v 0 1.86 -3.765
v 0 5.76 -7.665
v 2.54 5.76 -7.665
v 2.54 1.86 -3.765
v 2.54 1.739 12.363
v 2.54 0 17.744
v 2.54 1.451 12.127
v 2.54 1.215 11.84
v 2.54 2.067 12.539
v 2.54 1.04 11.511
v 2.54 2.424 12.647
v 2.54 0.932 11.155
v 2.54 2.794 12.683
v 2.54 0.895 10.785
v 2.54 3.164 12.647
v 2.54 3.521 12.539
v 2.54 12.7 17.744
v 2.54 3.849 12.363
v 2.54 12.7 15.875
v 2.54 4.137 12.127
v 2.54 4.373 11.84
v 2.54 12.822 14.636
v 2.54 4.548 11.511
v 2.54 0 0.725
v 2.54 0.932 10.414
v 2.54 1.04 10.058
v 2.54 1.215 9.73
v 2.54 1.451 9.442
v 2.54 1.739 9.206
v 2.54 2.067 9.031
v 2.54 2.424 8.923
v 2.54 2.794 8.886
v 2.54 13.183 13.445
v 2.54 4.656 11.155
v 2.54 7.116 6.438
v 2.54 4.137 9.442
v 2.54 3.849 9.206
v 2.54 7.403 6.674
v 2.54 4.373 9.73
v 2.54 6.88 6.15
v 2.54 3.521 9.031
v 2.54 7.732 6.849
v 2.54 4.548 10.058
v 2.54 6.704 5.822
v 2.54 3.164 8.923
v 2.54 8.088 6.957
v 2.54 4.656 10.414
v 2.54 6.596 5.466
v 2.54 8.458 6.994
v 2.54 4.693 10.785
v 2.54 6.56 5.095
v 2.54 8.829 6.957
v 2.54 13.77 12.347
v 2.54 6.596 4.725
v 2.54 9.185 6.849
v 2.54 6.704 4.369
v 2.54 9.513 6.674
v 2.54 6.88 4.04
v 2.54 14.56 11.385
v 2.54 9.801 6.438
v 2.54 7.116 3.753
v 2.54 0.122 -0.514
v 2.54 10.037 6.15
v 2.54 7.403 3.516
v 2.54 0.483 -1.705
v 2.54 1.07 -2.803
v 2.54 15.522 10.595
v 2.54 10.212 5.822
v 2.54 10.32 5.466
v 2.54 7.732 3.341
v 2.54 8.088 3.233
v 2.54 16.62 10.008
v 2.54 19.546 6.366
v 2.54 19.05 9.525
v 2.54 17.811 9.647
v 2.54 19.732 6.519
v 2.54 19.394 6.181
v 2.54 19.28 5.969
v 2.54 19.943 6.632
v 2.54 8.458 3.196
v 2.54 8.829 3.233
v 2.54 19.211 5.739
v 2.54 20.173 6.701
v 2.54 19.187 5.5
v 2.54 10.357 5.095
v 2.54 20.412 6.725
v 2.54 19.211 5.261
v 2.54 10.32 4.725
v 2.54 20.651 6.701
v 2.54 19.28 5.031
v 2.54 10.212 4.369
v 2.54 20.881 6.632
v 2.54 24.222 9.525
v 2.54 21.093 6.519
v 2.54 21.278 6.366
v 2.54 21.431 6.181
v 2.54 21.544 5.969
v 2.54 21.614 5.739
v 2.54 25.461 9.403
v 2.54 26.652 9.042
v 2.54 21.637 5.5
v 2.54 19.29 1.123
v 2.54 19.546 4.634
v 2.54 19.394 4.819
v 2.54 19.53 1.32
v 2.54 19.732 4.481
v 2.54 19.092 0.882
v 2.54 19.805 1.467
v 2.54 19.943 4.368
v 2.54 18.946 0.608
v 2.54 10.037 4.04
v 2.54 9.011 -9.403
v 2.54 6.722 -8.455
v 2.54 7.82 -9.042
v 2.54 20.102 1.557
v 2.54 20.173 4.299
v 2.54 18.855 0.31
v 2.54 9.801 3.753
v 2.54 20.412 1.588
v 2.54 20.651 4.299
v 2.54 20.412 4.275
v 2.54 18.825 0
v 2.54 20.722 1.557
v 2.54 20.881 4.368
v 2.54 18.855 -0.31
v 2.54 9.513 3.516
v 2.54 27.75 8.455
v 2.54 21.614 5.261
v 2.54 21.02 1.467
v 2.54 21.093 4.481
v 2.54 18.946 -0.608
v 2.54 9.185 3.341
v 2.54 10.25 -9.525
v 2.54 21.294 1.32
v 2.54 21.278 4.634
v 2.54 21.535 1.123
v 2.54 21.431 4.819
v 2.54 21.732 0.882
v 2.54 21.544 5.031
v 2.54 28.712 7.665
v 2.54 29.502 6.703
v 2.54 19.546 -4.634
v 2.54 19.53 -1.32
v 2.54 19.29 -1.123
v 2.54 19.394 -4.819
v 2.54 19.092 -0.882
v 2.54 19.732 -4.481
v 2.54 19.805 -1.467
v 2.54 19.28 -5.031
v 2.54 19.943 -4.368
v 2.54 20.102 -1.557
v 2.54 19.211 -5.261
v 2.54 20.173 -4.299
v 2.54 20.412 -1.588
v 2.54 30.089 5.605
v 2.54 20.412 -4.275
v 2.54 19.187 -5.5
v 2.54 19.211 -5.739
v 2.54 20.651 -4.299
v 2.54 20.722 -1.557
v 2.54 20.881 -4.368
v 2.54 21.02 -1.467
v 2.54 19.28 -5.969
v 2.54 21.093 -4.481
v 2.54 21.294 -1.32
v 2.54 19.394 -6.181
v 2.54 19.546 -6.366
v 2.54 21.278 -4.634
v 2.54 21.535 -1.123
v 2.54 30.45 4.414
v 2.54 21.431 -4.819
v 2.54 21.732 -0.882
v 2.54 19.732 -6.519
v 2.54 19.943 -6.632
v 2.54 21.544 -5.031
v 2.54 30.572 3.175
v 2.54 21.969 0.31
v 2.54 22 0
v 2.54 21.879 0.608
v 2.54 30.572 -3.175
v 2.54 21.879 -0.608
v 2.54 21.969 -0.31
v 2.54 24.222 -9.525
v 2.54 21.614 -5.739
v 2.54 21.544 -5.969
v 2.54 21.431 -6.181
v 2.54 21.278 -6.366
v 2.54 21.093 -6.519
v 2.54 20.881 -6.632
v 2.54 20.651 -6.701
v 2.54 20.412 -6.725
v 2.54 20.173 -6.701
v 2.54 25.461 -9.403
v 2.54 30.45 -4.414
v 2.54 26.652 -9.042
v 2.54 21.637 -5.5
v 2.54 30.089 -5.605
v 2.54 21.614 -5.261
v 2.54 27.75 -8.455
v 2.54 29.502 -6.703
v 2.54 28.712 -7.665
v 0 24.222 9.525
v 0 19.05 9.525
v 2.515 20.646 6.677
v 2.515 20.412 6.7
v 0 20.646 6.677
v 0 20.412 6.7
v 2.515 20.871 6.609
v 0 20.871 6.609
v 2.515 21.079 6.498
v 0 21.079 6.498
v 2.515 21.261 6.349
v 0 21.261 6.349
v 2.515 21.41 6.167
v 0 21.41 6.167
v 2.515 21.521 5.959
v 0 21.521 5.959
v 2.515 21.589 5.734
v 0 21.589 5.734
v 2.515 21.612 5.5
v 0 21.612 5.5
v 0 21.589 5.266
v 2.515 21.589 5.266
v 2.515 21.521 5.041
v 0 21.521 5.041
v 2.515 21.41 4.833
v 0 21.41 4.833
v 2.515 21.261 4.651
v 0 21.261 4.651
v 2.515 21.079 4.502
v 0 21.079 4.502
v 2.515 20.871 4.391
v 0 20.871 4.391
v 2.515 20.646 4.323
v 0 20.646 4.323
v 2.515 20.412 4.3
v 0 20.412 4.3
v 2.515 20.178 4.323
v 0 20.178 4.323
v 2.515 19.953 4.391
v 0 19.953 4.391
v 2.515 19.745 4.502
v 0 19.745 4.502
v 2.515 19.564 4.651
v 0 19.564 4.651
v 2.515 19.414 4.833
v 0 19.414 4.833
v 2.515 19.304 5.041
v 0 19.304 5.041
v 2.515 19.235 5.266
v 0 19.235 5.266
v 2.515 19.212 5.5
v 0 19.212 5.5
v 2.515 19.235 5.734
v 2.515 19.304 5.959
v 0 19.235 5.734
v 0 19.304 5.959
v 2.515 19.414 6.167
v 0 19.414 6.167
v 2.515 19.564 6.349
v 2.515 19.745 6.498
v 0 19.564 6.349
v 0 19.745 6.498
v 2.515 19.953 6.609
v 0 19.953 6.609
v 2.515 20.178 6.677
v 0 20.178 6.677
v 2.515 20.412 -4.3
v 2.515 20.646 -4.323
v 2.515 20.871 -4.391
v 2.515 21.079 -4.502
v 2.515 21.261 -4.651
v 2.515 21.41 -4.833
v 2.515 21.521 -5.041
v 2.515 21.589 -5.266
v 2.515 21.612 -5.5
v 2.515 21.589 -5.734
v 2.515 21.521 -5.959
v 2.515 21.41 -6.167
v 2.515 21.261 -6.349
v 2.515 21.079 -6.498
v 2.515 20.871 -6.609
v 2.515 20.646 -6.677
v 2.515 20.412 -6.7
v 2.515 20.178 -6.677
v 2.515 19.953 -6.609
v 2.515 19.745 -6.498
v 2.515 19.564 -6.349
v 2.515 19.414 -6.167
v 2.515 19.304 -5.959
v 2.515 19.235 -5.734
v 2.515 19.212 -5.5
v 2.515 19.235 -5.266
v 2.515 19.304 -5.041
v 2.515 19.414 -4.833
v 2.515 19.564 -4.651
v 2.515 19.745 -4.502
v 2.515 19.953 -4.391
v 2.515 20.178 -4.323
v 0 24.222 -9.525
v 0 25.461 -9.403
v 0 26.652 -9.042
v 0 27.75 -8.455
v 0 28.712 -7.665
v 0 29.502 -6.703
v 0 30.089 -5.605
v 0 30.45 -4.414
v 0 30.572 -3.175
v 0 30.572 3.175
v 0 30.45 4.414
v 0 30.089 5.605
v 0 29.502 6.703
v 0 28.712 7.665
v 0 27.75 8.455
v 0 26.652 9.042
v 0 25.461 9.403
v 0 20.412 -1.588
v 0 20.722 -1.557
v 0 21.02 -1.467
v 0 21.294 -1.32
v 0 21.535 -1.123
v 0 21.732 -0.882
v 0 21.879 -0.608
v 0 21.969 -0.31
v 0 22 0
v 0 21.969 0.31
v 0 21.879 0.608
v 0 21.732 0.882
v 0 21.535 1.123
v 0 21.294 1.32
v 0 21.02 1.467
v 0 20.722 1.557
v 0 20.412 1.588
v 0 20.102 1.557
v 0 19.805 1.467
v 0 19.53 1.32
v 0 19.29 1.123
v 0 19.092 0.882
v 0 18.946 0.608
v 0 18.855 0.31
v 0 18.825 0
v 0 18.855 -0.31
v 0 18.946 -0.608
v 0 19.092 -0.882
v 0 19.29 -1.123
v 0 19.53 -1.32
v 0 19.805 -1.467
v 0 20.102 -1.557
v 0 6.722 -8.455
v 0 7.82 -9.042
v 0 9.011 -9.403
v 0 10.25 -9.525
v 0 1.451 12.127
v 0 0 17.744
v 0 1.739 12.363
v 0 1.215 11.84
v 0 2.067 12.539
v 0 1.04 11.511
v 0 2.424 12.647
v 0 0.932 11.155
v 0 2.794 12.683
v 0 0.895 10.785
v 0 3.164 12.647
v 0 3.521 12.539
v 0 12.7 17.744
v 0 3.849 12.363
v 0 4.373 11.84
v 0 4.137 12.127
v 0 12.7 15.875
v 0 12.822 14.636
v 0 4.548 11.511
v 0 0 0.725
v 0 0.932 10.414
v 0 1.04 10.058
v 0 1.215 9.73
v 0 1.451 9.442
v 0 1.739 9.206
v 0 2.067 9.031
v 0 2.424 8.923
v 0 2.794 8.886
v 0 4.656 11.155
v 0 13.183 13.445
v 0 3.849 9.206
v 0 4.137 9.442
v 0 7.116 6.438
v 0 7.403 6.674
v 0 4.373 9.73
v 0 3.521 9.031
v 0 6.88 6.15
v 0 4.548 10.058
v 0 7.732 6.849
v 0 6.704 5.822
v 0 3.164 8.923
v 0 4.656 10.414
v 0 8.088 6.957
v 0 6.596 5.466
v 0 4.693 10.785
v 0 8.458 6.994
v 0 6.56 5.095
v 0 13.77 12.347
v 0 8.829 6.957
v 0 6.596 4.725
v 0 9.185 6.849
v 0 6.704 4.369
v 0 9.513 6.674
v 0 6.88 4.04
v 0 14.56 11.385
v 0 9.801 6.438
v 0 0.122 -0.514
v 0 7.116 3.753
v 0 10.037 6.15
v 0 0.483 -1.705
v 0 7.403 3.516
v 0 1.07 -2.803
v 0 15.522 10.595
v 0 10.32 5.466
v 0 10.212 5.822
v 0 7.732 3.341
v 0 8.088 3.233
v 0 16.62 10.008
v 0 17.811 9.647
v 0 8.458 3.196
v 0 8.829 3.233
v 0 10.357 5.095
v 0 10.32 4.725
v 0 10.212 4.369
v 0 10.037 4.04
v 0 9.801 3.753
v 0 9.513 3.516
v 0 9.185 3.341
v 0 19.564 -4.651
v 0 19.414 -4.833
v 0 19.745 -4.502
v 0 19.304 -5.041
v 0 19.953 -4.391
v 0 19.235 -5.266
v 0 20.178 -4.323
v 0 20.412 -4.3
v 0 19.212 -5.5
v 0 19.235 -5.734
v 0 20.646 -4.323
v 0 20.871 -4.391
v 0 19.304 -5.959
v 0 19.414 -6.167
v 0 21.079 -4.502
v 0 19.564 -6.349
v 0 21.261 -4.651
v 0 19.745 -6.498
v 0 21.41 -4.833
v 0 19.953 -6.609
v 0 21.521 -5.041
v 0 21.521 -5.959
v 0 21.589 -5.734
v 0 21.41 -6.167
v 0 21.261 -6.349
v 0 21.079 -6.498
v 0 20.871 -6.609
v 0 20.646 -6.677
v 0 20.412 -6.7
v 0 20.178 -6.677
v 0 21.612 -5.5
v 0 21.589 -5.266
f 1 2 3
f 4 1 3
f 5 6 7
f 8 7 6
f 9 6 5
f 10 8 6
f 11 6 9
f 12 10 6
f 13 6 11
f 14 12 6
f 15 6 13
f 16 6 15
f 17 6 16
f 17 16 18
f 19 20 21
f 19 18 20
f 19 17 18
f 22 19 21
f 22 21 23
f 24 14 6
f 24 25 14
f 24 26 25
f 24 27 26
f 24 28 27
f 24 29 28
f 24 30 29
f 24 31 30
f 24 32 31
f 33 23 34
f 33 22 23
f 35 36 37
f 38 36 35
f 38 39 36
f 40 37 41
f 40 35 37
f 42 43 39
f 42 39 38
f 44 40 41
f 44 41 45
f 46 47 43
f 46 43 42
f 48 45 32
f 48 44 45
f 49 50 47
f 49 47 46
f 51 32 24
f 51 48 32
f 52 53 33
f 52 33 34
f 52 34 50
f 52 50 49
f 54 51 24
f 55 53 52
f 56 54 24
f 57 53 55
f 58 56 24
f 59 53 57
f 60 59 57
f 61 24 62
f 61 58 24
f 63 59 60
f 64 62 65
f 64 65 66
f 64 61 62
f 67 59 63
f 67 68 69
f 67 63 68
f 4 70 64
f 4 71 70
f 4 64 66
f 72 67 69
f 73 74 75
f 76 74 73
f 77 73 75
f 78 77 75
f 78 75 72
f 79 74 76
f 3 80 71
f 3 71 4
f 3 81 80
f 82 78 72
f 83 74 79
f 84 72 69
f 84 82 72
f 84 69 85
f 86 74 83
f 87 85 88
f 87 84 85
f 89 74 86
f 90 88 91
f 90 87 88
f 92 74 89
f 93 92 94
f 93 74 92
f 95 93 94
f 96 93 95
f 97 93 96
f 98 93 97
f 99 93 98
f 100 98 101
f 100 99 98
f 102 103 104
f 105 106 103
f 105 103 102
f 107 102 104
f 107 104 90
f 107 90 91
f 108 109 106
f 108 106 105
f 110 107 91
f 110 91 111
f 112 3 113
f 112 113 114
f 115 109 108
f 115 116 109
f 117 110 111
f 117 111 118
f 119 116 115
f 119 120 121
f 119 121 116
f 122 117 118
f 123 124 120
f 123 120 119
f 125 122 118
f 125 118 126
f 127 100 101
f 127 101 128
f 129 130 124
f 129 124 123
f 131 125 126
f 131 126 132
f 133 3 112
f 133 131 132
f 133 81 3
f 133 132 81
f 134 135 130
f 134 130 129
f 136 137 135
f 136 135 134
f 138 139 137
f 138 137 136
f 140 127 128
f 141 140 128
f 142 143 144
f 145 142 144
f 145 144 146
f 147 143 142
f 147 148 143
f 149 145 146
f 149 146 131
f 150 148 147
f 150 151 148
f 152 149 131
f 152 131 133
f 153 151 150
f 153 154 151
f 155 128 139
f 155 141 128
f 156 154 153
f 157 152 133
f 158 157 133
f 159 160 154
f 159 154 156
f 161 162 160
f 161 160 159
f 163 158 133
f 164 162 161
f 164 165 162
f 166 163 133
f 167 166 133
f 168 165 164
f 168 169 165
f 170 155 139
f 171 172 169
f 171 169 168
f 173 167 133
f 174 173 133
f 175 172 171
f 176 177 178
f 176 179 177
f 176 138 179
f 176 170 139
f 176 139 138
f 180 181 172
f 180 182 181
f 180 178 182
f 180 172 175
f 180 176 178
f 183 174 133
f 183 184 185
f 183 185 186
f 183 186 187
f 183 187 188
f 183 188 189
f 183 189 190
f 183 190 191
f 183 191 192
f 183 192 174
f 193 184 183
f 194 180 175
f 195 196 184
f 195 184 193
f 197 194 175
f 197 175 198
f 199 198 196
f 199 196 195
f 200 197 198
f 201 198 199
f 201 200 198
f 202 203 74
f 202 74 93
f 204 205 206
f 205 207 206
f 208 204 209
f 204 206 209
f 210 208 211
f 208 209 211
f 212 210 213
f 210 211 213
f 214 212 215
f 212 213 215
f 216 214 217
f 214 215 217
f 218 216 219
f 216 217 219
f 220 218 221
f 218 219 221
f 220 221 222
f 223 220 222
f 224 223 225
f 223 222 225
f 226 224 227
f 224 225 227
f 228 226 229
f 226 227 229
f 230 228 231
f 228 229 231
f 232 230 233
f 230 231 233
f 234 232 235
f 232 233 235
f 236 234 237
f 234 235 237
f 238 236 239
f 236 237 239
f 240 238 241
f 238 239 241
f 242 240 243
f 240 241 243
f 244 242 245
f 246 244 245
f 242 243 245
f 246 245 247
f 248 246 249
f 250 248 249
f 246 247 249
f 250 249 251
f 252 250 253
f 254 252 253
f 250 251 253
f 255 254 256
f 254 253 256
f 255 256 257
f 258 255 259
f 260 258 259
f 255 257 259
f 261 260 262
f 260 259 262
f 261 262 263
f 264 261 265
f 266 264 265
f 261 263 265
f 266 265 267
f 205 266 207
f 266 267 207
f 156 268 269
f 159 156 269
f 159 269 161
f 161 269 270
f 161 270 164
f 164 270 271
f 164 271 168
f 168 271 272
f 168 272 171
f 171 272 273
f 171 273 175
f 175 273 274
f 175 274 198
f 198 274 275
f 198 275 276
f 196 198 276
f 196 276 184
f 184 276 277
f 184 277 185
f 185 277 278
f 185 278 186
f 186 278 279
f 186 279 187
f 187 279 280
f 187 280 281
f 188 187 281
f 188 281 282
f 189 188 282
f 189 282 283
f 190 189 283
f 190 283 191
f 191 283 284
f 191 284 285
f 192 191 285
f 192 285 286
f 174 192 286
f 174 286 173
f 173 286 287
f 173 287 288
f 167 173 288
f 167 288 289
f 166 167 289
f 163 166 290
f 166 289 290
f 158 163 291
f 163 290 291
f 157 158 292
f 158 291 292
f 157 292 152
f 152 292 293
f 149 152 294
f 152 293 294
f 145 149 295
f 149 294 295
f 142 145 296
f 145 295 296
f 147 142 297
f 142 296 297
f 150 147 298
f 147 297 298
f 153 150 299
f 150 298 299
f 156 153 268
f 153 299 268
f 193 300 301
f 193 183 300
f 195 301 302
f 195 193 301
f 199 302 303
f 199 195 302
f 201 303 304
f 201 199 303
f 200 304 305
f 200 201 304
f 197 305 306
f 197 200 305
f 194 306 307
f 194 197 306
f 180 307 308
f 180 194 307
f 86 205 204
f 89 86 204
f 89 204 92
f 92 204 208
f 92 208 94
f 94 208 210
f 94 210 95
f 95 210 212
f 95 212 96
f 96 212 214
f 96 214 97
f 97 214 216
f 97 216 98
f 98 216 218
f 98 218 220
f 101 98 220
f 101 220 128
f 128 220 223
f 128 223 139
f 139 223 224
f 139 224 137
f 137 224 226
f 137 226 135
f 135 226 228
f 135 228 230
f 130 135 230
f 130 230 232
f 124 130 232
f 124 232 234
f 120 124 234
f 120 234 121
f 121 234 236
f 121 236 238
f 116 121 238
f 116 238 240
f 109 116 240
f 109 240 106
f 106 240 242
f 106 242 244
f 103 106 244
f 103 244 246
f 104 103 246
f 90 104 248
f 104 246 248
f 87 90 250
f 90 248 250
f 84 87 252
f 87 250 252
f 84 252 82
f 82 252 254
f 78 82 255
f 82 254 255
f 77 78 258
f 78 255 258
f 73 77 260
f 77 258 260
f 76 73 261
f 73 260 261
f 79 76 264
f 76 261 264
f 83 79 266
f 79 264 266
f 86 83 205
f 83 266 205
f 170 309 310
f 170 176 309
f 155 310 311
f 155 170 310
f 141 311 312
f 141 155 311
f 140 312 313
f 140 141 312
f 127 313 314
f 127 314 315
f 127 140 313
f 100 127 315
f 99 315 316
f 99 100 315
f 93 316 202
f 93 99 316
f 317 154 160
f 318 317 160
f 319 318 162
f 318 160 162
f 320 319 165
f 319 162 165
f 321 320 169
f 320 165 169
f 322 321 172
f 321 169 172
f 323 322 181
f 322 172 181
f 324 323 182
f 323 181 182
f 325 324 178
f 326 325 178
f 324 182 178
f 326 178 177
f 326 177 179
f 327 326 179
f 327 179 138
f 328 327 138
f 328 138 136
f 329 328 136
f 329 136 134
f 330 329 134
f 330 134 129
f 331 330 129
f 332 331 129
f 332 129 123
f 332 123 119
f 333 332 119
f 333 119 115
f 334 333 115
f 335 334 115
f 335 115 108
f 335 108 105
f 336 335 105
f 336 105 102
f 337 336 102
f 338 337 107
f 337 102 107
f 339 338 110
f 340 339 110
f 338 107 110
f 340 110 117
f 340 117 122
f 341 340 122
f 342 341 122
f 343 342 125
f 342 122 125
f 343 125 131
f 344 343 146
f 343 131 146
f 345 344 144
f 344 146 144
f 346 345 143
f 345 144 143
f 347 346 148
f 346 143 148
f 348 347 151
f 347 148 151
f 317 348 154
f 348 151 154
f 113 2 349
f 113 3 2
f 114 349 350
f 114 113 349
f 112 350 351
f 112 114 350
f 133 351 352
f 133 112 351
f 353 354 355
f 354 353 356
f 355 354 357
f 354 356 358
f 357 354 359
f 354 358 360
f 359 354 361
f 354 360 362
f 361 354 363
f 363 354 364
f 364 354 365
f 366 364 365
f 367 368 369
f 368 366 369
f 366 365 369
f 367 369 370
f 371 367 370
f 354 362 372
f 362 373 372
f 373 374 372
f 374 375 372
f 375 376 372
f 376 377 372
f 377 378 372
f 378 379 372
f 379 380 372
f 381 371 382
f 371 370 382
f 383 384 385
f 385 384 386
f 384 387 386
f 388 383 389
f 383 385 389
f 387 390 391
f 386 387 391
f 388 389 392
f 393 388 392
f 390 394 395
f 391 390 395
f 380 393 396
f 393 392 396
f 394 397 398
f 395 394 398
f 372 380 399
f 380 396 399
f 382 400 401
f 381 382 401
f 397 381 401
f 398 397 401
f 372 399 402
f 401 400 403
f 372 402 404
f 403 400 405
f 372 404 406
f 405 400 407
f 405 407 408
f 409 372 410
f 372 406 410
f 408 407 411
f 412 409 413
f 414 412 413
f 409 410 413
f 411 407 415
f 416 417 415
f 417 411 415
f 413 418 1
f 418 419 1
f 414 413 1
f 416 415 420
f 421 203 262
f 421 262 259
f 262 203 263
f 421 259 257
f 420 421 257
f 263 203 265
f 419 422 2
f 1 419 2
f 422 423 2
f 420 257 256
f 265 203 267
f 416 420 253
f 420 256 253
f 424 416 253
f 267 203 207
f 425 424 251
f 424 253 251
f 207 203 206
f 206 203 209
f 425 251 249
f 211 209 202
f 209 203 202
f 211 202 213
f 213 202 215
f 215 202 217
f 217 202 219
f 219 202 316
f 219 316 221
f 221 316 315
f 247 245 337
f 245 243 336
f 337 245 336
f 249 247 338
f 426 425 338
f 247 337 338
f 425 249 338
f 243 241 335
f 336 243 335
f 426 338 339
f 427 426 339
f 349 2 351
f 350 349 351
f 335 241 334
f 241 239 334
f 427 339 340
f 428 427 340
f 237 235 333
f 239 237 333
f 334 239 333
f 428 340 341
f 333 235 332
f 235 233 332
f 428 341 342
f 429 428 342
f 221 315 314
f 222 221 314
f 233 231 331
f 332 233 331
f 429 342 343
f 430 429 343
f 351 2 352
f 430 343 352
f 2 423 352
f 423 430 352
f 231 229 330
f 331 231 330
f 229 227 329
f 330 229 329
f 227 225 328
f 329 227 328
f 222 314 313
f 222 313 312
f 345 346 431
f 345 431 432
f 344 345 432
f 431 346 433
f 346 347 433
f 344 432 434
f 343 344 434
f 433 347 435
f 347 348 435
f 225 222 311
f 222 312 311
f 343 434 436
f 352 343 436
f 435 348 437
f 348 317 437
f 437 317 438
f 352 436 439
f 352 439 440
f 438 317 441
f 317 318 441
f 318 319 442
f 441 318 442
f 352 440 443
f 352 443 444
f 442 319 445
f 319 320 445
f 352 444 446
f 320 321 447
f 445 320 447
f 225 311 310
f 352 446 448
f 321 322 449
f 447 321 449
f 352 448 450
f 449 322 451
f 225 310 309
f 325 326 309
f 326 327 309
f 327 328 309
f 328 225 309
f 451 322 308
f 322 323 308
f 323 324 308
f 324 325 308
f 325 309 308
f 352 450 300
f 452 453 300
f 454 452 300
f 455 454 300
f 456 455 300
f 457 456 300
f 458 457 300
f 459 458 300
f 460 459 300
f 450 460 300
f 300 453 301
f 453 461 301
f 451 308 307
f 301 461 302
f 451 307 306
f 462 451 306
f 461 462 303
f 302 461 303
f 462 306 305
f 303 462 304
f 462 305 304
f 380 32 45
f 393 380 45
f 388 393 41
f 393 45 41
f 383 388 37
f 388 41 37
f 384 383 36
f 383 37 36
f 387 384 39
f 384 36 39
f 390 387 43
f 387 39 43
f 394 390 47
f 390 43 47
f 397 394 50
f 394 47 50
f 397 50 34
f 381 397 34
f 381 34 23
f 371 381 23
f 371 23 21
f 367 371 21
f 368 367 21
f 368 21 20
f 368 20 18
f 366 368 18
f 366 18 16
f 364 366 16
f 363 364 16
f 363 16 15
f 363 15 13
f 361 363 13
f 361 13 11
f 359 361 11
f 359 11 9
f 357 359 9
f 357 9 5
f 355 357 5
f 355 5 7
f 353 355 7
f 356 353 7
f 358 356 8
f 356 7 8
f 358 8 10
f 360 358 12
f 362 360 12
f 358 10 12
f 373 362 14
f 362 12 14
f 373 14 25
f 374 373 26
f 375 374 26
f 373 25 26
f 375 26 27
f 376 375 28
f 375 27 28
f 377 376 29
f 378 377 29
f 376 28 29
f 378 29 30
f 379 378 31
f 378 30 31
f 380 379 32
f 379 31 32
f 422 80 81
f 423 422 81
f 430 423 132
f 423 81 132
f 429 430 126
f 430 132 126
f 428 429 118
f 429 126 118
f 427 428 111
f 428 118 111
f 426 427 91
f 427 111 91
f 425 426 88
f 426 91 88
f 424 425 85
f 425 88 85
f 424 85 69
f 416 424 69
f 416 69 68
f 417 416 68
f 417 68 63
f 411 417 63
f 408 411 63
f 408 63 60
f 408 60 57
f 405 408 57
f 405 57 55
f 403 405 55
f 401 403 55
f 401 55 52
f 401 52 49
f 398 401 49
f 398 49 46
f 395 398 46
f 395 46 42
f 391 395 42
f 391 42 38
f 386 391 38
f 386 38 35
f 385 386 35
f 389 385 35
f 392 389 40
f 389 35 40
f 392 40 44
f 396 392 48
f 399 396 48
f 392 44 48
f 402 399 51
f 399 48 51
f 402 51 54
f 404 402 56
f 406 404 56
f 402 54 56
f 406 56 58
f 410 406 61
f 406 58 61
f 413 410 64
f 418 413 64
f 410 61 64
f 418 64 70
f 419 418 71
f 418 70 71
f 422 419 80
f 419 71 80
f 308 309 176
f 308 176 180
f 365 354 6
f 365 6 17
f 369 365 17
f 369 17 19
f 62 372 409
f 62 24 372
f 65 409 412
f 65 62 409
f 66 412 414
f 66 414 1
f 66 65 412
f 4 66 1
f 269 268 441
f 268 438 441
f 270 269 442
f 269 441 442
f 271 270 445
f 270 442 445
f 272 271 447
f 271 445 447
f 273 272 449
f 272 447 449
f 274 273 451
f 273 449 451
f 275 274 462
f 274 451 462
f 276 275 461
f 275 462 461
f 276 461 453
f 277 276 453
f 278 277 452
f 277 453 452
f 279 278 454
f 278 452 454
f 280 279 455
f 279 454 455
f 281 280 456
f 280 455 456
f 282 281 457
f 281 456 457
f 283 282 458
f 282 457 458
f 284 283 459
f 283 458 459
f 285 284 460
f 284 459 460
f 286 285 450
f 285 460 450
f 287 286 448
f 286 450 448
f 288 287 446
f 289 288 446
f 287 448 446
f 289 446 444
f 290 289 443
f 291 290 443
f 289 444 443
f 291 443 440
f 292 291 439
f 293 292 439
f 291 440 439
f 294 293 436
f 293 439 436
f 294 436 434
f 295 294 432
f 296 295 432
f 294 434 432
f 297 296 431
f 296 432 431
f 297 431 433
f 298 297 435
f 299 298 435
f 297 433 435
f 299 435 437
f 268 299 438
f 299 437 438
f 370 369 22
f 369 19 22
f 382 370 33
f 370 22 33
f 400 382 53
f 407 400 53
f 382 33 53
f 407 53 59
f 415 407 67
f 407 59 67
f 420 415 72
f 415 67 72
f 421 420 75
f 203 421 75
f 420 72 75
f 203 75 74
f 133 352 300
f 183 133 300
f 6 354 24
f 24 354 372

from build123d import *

# Parameters (mm, degrees)
SKETCH1_W                      = 19.05
SKETCH1_H                      = 30.5721766
BOSS_EXTRUDE1_DEPTH            = 2.54
SKETCH2_R                      = 1.5875
CUT_EXTRUDE1_DEPTH             = 33.122191816
M2_CLEARANCE_HOLE1_D           = 2.4
M2_CLEARANCE_HOLE1_DEPTH       = 12.0000014
M2_CLEARANCE_HOLE1_CSINK_D     = 2.45
M2_CLEARANCE_HOLE1_CSINK_ANGLE = 90
M2_CLEARANCE_HOLE1_TIP         = 0.721032743
SKETCH6_W                      = 8.2193384
SKETCH6_H                      = 12.7
BOSS_EXTRUDE2_DEPTH            = 2.54
CHAMFER1_SIZE                  = 7.62
FILLET2_R                      = 6.35
F_6_CLEARANCE_HOLE1_D          = 3.7973


with BuildPart() as part:
    # Sketch1 → Boss-Extrude1 (new body)
    with BuildSketch(Plane(origin=(0, 0, 0), x_dir=(0, 0, -1), z_dir=(1, 0, 0))):
        with Locations((0, 15.2860883)):
            Rectangle(SKETCH1_W, SKETCH1_H)
    extrude(amount=BOSS_EXTRUDE1_DEPTH)

    # Sketch2 → Cut-Extrude1 (cut, through all)
    with BuildSketch(Plane(origin=(2.54, 0, 0), x_dir=(0, 0, -1), z_dir=(1, 0, 0))):
        with Locations((0, 20.4121766)):
            Circle(SKETCH2_R)
    extrude(amount=-CUT_EXTRUDE1_DEPTH, mode=Mode.SUBTRACT)

    # M2 Clearance Hole1
    with Locations(Plane(origin=(2.54, 0, 0), x_dir=(0, 0, -1), z_dir=(1, 0, 0))):
        with Locations((-5.5, 20.4121766), (5.5, 20.4121766)):
            CounterSinkHole(M2_CLEARANCE_HOLE1_D / 2, M2_CLEARANCE_HOLE1_CSINK_D / 2, depth=M2_CLEARANCE_HOLE1_DEPTH, counter_sink_angle=M2_CLEARANCE_HOLE1_CSINK_ANGLE)
            with Locations((0, 0, -(M2_CLEARANCE_HOLE1_DEPTH + M2_CLEARANCE_HOLE1_TIP / 2))):  # 118° drill point
                Cone(0, M2_CLEARANCE_HOLE1_D / 2, M2_CLEARANCE_HOLE1_TIP, mode=Mode.SUBTRACT)

    # Sketch6 → Boss-Extrude2 (add)
    with BuildSketch(Plane(origin=(0, 0, 0), x_dir=(0, 0, -1), z_dir=(1, 0, 0))):
        with Locations((-13.6346692, 6.35)):
            Rectangle(SKETCH6_W, SKETCH6_H)
    extrude(amount=BOSS_EXTRUDE2_DEPTH)

    # Chamfer1
    chamfer1_edges = [part.edges().sort_by_distance(p)[0] for p in [
        (1.27, 0, -9.525),
    ]]
    chamfer(chamfer1_edges, length=CHAMFER1_SIZE)

    # Fillet2
    fillet2_edges = [part.edges().sort_by_distance(p)[0] for p in [
        (1.27, 12.7, 9.525),
        (1.27, 7.62, -9.525),
        (1.27, 0, -1.905),
        (1.27, 30.5721766, 9.525),
        (1.27, 30.5721766, -9.525),
    ]]
    fillet(fillet2_edges, radius=FILLET2_R)

    # #6 Clearance Hole1 (through all)
    with Locations(Plane.ZY):
        with Locations((10.7847384, 2.794), (5.0951384, 8.4582)):
            Hole(F_6_CLEARANCE_HOLE1_D / 2)


solid = part.part
